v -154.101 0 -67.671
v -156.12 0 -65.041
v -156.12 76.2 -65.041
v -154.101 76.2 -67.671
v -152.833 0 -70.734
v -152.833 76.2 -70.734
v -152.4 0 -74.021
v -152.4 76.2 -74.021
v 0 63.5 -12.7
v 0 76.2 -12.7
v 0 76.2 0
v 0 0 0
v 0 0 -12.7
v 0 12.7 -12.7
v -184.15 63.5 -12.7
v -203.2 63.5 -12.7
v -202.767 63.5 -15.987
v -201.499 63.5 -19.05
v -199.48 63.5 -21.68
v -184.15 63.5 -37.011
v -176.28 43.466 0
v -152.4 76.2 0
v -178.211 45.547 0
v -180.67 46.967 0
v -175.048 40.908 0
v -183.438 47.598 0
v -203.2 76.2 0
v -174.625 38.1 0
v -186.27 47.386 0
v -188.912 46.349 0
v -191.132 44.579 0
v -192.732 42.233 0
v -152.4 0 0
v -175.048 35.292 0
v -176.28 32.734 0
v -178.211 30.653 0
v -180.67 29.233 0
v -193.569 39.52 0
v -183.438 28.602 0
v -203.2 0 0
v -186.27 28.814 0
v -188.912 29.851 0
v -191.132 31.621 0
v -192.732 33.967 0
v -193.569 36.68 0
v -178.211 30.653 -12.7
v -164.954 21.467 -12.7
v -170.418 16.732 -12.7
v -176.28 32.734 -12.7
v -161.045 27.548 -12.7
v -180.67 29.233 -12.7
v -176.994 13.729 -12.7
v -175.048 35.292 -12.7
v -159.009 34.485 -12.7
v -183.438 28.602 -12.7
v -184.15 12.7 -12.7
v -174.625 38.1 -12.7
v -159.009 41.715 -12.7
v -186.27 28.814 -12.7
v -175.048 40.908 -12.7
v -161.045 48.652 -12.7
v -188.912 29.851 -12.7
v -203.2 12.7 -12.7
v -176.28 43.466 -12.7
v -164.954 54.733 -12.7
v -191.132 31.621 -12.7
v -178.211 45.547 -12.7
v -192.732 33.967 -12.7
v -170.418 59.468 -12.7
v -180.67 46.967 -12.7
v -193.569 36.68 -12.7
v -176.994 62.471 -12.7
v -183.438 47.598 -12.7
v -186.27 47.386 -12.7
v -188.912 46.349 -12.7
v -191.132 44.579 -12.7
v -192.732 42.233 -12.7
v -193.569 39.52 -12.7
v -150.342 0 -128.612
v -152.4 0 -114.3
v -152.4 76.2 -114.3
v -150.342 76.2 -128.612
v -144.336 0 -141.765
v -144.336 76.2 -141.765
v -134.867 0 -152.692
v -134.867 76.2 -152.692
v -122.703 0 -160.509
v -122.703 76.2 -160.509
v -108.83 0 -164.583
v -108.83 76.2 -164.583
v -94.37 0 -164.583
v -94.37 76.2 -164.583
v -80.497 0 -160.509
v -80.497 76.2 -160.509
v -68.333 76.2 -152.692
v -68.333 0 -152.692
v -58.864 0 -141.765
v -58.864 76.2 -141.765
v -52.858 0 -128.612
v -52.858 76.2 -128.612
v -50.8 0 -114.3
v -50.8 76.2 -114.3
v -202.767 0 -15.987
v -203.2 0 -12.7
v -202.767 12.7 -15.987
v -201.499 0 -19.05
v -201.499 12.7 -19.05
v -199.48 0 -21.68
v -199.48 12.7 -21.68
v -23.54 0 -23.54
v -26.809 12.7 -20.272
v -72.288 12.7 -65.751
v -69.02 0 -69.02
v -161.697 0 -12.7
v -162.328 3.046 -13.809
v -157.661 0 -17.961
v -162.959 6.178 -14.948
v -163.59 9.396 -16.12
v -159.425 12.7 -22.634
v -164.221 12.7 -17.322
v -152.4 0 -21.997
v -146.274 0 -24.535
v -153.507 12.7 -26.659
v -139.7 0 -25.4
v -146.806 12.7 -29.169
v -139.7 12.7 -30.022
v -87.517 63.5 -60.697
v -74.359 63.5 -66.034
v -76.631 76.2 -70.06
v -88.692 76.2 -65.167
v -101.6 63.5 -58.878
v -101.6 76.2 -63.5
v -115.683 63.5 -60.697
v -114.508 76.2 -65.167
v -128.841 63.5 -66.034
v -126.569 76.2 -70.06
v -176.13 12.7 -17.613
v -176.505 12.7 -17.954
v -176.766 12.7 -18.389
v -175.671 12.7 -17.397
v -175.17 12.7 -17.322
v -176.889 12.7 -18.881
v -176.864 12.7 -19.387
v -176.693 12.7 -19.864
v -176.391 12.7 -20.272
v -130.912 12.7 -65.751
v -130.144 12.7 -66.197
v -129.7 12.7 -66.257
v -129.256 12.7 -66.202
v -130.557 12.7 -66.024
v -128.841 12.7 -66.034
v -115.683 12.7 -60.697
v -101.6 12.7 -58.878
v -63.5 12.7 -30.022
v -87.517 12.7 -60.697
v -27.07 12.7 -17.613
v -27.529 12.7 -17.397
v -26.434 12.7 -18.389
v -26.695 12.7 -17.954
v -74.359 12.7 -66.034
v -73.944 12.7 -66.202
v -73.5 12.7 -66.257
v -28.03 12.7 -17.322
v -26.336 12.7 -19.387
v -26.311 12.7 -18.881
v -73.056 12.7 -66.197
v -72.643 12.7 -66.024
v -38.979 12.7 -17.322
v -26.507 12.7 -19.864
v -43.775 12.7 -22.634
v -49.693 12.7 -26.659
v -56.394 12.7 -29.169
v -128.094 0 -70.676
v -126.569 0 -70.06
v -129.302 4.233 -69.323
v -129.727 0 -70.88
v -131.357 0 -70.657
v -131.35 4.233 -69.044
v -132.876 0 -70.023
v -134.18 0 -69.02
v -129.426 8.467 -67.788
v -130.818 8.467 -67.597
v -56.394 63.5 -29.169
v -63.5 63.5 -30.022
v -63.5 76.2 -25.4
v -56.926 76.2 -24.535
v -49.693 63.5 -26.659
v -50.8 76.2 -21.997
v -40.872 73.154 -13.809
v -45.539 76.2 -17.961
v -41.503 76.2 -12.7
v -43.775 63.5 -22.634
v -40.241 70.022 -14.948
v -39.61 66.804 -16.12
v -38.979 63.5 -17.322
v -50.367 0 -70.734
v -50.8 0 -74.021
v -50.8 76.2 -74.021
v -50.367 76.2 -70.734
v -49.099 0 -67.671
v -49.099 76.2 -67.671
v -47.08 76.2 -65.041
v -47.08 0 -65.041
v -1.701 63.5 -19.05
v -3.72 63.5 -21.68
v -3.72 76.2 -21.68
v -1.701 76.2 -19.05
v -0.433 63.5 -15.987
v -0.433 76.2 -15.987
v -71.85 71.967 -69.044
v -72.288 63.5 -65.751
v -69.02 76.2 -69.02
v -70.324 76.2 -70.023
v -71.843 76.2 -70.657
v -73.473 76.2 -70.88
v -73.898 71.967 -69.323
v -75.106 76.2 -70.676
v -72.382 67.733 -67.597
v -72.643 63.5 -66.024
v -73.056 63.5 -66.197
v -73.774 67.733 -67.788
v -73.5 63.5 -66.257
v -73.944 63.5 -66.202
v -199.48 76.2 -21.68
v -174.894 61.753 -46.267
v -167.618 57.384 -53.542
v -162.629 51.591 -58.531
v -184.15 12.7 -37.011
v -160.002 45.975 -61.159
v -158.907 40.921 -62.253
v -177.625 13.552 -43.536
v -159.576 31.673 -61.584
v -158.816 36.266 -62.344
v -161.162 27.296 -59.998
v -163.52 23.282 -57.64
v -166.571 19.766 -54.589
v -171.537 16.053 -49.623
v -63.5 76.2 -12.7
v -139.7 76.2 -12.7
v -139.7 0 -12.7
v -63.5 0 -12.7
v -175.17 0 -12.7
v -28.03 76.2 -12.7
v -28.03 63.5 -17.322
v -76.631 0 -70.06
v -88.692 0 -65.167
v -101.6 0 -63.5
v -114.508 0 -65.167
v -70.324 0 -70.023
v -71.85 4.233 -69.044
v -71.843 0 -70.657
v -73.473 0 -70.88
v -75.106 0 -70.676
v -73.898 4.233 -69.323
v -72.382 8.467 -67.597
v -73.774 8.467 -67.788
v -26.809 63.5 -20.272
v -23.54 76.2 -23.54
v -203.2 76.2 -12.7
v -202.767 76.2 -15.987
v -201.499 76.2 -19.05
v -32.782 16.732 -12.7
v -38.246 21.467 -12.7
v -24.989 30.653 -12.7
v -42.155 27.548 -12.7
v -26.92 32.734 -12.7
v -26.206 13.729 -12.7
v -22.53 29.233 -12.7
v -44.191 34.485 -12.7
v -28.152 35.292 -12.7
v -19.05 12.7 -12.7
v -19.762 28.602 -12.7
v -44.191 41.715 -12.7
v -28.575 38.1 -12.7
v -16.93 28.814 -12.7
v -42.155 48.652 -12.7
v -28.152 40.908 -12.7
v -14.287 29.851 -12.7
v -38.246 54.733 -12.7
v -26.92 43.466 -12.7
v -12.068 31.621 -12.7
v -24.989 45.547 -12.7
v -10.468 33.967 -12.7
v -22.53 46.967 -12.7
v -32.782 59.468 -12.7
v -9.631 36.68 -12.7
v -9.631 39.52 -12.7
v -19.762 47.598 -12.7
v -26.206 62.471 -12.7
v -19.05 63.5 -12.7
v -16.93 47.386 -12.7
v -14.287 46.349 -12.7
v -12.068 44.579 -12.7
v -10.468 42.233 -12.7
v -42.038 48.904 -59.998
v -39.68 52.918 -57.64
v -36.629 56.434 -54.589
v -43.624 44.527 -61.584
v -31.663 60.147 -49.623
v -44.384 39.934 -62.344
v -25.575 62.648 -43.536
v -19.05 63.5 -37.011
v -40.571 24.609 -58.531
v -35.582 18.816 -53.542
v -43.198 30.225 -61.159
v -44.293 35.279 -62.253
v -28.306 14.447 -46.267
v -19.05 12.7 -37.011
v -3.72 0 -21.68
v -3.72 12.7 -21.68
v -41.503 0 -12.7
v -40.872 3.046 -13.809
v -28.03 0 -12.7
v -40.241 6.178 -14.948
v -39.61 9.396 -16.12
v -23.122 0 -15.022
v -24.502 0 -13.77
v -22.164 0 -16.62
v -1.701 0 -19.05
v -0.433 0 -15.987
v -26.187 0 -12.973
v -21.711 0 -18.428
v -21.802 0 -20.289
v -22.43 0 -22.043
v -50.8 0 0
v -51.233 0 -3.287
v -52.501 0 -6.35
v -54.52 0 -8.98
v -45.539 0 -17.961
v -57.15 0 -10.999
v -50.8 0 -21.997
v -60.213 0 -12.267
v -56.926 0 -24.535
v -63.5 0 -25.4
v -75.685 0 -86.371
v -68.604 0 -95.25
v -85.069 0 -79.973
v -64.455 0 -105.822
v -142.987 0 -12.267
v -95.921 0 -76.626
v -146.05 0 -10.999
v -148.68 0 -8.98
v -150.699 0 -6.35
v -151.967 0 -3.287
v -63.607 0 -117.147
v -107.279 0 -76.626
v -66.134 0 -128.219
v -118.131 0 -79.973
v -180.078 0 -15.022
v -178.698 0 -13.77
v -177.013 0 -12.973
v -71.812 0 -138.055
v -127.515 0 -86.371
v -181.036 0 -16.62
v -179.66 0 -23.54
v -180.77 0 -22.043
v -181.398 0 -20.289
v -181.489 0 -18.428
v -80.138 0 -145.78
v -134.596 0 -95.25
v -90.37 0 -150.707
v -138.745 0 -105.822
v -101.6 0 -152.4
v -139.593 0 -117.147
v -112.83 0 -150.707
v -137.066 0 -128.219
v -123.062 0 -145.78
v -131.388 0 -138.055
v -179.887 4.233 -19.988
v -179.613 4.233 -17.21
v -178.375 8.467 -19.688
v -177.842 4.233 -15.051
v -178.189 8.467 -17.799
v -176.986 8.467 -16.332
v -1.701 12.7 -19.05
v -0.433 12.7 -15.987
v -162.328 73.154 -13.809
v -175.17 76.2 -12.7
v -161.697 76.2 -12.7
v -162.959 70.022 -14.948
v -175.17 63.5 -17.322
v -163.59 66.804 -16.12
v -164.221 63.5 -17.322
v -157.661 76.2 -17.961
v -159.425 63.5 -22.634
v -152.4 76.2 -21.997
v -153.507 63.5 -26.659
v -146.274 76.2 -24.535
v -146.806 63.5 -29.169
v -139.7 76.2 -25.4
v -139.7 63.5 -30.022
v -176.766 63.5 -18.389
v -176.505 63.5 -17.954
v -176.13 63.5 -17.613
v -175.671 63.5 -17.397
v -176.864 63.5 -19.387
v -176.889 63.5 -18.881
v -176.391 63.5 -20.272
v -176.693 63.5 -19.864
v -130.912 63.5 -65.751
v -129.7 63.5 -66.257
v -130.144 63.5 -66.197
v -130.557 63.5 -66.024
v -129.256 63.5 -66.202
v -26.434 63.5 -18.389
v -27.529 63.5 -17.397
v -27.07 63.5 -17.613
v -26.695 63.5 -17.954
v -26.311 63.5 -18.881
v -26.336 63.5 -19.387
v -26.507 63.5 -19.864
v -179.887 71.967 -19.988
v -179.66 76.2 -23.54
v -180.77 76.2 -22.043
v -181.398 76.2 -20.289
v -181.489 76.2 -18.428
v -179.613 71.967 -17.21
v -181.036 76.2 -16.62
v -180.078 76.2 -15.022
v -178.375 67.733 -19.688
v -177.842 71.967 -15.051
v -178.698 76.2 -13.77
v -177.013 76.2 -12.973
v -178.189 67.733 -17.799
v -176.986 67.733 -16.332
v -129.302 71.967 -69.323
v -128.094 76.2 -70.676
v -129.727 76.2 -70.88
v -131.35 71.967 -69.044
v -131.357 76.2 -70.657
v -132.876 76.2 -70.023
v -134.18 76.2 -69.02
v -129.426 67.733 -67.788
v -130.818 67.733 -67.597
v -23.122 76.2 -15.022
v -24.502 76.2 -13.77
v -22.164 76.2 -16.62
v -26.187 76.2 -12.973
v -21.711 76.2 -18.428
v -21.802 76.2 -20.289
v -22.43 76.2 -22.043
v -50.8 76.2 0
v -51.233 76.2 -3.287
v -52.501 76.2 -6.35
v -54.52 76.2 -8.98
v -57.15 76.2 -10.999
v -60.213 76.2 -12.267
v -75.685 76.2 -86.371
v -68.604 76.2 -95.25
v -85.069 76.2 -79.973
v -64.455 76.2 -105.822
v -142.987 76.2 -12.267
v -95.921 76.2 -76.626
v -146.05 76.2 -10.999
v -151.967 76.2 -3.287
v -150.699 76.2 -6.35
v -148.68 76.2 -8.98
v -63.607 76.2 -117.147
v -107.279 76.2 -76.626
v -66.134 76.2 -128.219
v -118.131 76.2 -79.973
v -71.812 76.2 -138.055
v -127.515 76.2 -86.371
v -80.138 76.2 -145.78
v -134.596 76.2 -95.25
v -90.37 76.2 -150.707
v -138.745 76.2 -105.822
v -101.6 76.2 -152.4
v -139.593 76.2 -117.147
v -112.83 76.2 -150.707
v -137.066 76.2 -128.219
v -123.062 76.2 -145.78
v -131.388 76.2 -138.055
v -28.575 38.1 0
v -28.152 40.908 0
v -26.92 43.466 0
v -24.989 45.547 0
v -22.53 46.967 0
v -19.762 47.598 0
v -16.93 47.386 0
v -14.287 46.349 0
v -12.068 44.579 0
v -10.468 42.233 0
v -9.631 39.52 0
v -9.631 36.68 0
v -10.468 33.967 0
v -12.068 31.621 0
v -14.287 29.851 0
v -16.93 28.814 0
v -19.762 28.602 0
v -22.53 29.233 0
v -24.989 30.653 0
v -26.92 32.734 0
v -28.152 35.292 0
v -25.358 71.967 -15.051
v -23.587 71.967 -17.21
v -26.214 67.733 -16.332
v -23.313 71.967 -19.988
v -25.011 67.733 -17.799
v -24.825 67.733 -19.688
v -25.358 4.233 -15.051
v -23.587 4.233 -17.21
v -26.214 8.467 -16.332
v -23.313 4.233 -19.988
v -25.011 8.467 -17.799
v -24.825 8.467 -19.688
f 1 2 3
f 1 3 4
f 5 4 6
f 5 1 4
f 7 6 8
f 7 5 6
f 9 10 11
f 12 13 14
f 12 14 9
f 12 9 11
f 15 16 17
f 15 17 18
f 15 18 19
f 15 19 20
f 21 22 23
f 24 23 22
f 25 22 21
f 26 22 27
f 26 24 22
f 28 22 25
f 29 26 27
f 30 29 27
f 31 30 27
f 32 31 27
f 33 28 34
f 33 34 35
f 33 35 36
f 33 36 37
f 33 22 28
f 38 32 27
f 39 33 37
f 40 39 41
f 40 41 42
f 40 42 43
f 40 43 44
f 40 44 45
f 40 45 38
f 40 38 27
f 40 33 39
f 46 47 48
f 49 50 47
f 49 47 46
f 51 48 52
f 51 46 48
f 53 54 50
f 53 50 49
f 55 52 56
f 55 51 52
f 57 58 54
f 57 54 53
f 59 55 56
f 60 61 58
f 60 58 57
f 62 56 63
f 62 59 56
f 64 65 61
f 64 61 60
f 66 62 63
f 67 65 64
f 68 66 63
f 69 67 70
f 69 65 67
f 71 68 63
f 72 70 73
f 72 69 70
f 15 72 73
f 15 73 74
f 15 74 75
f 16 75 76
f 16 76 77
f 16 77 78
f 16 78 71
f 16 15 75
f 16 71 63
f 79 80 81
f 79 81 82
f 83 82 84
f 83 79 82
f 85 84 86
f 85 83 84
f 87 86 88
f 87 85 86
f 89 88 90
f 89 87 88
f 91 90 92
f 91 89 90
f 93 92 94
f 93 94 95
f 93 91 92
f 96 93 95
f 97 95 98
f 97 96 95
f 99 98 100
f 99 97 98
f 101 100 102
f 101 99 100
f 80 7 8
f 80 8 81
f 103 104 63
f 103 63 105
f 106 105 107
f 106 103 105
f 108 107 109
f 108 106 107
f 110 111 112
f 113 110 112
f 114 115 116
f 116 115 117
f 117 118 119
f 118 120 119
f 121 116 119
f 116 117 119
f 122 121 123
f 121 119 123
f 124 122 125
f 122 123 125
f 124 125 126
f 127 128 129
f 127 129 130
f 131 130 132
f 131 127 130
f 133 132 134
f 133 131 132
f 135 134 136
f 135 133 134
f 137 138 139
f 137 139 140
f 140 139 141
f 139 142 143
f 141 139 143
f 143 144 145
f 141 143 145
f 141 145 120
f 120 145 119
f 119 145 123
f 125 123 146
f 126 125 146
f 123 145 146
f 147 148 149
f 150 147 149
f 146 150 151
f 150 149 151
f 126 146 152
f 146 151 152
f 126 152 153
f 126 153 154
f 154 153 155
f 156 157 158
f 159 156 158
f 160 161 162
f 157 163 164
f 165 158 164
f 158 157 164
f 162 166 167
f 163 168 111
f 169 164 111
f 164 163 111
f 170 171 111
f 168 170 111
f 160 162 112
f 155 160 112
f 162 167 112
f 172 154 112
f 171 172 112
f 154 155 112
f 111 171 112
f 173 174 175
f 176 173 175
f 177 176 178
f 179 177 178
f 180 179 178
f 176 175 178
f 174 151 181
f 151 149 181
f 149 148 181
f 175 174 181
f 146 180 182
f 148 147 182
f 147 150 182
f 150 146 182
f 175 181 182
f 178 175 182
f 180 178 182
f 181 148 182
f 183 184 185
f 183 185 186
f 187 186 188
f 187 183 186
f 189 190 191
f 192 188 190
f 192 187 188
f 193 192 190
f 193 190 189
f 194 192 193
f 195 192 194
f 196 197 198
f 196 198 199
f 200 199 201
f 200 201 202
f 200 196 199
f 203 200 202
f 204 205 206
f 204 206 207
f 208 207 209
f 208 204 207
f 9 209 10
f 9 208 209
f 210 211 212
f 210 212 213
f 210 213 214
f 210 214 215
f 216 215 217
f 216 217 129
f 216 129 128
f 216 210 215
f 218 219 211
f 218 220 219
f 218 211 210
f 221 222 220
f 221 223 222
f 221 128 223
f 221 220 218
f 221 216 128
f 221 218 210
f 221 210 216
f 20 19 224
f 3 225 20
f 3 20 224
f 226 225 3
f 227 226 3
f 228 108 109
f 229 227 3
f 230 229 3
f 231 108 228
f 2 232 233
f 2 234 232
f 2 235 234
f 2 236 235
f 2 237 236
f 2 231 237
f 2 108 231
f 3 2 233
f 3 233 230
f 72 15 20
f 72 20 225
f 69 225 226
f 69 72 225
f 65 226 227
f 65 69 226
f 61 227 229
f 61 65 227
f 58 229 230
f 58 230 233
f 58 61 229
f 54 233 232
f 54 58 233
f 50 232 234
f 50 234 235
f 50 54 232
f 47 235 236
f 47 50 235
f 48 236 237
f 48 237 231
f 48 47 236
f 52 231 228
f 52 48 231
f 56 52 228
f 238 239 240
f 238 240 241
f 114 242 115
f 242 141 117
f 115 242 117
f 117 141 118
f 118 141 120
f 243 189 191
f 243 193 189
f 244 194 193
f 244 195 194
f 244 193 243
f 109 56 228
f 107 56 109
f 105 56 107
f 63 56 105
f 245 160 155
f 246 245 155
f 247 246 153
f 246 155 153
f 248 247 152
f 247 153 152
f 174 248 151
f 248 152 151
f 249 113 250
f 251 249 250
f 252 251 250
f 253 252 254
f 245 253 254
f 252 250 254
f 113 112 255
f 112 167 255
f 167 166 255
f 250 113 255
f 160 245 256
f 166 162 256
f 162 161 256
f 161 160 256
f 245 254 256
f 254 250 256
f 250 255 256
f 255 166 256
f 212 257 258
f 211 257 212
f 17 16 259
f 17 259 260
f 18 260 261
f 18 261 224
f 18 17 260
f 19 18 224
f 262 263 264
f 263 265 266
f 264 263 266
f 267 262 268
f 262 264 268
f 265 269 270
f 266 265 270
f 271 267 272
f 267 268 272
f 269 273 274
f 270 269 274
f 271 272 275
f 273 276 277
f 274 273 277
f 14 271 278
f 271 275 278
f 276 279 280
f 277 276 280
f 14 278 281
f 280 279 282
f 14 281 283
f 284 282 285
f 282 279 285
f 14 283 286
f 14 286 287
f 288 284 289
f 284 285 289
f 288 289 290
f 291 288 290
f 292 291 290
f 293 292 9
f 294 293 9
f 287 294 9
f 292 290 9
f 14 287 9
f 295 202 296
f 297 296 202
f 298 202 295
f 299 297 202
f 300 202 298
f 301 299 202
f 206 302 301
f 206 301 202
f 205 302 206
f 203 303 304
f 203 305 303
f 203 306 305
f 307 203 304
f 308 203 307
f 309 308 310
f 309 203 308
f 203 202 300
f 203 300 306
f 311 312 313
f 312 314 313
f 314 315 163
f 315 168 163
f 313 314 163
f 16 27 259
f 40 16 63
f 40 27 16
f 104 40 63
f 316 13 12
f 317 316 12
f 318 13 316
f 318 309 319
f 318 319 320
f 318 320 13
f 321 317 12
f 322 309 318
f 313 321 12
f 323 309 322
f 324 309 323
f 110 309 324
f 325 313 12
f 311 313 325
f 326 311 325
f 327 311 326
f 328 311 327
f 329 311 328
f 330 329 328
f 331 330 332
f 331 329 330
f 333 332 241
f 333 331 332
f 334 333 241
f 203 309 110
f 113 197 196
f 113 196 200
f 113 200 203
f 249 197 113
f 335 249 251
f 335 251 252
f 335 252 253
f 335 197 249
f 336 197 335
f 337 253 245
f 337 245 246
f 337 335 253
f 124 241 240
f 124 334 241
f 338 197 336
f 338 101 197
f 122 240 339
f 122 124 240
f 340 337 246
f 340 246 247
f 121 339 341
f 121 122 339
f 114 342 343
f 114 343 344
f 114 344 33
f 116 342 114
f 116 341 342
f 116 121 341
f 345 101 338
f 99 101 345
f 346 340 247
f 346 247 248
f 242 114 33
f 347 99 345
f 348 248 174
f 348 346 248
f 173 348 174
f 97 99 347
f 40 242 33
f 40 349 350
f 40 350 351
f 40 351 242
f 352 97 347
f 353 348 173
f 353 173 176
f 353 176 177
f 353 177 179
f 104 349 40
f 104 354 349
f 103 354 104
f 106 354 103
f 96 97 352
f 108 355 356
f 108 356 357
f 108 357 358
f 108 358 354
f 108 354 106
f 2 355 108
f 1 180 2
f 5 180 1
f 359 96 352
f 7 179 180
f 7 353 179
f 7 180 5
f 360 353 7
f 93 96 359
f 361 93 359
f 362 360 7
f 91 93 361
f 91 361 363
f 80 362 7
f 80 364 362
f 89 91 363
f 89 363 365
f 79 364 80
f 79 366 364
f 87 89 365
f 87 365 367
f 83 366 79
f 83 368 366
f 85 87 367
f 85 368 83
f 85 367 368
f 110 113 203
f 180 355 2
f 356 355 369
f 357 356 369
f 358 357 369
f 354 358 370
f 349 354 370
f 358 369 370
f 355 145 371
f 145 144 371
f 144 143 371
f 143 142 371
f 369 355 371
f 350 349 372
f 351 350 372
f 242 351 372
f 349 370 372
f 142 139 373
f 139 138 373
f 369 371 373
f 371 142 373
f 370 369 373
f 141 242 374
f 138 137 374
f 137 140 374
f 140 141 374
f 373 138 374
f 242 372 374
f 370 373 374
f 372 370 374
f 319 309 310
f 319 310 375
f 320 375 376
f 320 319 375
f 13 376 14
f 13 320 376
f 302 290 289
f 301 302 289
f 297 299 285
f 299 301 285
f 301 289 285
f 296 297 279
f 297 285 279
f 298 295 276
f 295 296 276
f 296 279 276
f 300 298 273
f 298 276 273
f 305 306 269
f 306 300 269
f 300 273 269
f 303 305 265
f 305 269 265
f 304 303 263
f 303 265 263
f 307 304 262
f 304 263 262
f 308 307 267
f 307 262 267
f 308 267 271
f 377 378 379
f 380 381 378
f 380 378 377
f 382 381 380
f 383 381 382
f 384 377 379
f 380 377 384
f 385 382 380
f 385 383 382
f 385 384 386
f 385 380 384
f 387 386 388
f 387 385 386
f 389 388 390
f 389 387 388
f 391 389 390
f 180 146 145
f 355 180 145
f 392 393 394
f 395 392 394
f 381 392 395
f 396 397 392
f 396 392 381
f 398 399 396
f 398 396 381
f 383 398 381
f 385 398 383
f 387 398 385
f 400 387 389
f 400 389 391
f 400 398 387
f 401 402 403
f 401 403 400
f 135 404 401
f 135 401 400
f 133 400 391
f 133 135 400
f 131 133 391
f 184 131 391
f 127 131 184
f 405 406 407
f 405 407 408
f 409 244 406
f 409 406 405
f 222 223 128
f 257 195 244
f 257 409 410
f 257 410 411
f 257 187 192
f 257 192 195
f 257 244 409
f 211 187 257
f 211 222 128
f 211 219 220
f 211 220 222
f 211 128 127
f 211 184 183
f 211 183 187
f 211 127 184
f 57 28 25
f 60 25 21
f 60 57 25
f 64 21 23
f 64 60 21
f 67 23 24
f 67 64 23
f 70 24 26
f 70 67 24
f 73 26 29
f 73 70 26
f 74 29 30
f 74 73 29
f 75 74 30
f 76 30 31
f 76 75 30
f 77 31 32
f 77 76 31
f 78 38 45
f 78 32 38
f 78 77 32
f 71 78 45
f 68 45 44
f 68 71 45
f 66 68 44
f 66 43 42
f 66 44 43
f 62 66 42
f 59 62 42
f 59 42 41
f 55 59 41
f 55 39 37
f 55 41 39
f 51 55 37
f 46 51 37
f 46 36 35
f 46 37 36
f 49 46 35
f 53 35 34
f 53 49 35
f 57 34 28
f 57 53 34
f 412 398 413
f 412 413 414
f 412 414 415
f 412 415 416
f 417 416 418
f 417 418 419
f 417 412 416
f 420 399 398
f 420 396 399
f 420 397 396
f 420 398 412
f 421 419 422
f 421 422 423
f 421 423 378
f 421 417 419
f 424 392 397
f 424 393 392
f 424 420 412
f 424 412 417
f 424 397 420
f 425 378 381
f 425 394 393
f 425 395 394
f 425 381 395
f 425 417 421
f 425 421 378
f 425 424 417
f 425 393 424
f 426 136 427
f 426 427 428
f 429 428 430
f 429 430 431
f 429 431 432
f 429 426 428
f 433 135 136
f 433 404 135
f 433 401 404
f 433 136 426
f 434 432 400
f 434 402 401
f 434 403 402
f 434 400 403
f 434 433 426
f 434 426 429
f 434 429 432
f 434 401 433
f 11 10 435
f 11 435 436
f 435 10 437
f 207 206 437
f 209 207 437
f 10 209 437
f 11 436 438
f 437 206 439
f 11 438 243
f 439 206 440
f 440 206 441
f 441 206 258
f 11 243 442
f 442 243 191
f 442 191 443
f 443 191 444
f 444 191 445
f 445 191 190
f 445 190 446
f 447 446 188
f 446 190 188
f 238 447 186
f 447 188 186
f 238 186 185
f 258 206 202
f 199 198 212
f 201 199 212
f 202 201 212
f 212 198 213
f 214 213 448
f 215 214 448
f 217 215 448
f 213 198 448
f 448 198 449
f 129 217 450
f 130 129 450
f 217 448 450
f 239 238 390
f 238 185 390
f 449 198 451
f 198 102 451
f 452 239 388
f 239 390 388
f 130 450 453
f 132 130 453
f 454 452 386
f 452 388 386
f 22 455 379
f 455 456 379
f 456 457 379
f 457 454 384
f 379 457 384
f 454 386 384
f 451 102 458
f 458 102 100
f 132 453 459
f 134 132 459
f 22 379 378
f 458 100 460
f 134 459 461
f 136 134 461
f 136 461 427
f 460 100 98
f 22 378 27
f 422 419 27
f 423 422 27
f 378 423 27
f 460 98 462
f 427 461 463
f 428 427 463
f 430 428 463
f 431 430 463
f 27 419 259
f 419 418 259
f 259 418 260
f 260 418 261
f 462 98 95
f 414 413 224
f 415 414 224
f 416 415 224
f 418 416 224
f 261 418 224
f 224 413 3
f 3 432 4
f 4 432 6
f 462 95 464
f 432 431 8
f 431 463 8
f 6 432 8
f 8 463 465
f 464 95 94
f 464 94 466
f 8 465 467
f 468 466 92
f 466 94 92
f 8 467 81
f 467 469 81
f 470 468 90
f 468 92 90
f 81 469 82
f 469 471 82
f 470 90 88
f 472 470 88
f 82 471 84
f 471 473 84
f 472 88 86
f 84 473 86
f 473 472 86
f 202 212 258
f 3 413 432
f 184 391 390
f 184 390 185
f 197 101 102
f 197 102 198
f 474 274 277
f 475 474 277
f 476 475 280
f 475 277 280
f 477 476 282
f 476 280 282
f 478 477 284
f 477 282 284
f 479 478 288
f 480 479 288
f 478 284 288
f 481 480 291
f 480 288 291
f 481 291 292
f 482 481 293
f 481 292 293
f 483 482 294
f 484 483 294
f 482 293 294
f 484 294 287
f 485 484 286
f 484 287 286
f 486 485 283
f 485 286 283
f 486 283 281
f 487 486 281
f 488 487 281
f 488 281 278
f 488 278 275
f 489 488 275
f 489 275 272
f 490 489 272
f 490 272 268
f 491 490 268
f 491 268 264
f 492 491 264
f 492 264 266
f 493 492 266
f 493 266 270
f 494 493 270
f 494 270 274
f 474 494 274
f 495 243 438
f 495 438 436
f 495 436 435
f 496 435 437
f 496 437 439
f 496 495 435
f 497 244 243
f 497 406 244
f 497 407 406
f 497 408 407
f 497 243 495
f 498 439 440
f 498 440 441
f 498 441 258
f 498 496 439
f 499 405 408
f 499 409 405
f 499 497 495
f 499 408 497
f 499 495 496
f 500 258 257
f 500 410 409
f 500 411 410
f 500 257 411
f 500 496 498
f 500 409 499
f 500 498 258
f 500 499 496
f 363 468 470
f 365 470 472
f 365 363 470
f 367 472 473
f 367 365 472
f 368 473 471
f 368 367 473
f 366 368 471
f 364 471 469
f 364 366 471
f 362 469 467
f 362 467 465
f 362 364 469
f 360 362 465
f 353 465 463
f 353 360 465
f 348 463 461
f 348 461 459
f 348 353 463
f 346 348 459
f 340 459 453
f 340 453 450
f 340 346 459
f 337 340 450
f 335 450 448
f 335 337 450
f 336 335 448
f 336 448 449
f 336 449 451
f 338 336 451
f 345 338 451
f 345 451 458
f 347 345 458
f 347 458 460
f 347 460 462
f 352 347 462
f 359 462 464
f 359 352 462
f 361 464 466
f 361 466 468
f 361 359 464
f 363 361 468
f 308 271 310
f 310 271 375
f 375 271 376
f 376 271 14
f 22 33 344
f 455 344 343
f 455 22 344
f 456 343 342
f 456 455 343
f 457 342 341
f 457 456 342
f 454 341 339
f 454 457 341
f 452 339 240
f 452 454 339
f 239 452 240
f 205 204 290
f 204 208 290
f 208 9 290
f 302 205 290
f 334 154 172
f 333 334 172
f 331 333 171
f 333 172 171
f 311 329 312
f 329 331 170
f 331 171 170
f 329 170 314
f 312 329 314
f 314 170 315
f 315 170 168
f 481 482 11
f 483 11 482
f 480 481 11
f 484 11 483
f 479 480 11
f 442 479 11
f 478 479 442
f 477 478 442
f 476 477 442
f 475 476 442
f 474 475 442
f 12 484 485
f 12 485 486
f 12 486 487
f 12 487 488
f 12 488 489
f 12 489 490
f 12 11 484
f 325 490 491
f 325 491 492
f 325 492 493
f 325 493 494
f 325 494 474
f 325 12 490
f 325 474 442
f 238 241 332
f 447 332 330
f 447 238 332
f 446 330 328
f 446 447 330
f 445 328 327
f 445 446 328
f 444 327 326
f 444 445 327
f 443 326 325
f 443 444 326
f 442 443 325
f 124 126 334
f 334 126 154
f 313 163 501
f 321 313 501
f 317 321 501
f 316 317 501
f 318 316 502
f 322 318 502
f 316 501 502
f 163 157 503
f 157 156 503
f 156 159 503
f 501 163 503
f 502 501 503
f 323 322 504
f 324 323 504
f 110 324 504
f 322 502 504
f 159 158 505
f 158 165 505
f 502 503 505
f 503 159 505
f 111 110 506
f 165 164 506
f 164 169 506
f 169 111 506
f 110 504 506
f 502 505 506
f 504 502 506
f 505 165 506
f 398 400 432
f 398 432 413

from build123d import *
from OCP.BRepFilletAPI import BRepFilletAPI_MakeChamfer

# Parameters (mm, degrees)
SKETCH1_R                  = 38.1
BOSS_EXTRUDE1_DEPTH        = 76.2
CUT_EXTRUDE1_DEPTH         = 273.680564031
CUT_EXTRUDE2_START         = -12.7
CUT_EXTRUDE2_DEPTH         = 260.980564031
SKETCH5_R                  = 9.525
CUT_EXTRUDE3_DEPTH         = 266.183785326
CUT_EXTRUDE4_START         = -12.7
CUT_EXTRUDE4_DEPTH         = 12.7
CHAMFER1_SIZE              = 12.7
CHAMFER1_SIZE_2            = 4.622421975
CHAMFER1_OF_MIRROR2_SIZE   = 12.7
CHAMFER1_OF_MIRROR2_SIZE_2 = 4.622421975


with BuildPart() as part:
    # Sketch1 → Boss-Extrude1 (new body)
    with BuildSketch(Plane(origin=(0, 0, 0), x_dir=(1, 0, 0), z_dir=(0, 1, 0))):
        with BuildLine():
            Line((0, 0), (-203.2, 0))
            Line((-203.2, 0), (-203.2, 12.7))
            ThreePointArc((-203.2, 12.7), (-202.233270063, 17.560079591), (-199.480256121, 21.680256121))
            Line((-199.480256121, 21.680256121), (-156.119743879, 65.040768363))
            ThreePointArc((-156.119743879, 65.040768363), (-153.366729937, 69.160944893), (-152.4, 74.021024484))
            Line((-152.4, 74.021024484), (-152.4, 114.3))
            ThreePointArc((-152.4, 114.3), (-101.6, 165.1), (-50.8, 114.3))
            Line((-50.8, 114.3), (-50.8, 74.021024484))
            ThreePointArc((-50.8, 74.021024484), (-49.833270063, 69.160944893), (-47.080256121, 65.040768363))
            Line((-47.080256121, 65.040768363), (-3.719743879, 21.680256121))
            ThreePointArc((-3.719743879, 21.680256121), (-0.966729937, 17.560079591), (0, 12.7))
            Line((0, 12.7), (0, 0))
        make_face()
        with Locations(Location((-101.6, 114.3, 0), (0, 0, 90))):
            Circle(SKETCH1_R, mode=Mode.SUBTRACT)
    extrude(amount=BOSS_EXTRUDE1_DEPTH)

    # Sketch2 → Cut-Extrude1 (cut, through all)
    with BuildSketch(Plane(origin=(0, 76.2, 0), x_dir=(1, 0, 0), z_dir=(0, 1, 0))):
        with BuildLine():
            Line((-139.7, 12.7), (-63.5, 12.7))
            ThreePointArc((-63.5, 12.7), (-50.8, 0), (-63.5, -12.7))
            Line((-63.5, -12.7), (-139.7, -12.7))
            ThreePointArc((-139.7, -12.7), (-152.4, 0), (-139.7, 12.7))
        make_face()
    extrude(amount=-CUT_EXTRUDE1_DEPTH, mode=Mode.SUBTRACT)

    # Sketch4 → Cut-Extrude2 (cut, through all)
    with BuildSketch(Plane.XY.offset(CUT_EXTRUDE2_START)):
        with BuildLine():
            Line((0, 63.5), (-19.05, 63.5))
            ThreePointArc((-19.05, 63.5), (-44.45, 38.1), (-19.05, 12.7))
            Line((-19.05, 12.7), (0, 12.7))
            Line((0, 12.7), (0, 63.5))
        make_face()
    cut_extrude2 = extrude(amount=-CUT_EXTRUDE2_DEPTH, mode=Mode.SUBTRACT)

    # Sketch5 → Cut-Extrude3 (cut, through all)
    with BuildSketch(Plane(origin=(0, 0, -12.7), x_dir=(-1, 0, 0), z_dir=(0, 0, -1))):
        with Locations((19.05, 38.1)):
            Circle(SKETCH5_R)
    cut_extrude3 = extrude(amount=-CUT_EXTRUDE3_DEPTH, mode=Mode.SUBTRACT)

    # Mirror1: Cut-Extrude2, Cut-Extrude3 across plane
    add(cut_extrude2.mirror(Plane(origin=(-101.6, 0, 0), x_dir=(0, 0, 1), z_dir=(1, 0, 0))), mode=Mode.SUBTRACT)
    add(cut_extrude3.mirror(Plane(origin=(-101.6, 0, 0), x_dir=(0, 0, 1), z_dir=(1, 0, 0))), mode=Mode.SUBTRACT)

    # Sketch6 → Cut-Extrude4 (cut)
    with BuildSketch(Plane(origin=(0, 76.2, 0), x_dir=(1, 0, 0), z_dir=(0, 1, 0)).offset(CUT_EXTRUDE4_START)):
        with BuildLine():
            Line((-23.540128061, 23.540128061), (-69.01989759, 69.01989759))
            ThreePointArc((-69.01989759, 69.01989759), (-72.650432416, 70.821319376), (-76.631133912, 70.059795138))
            ThreePointArc((-76.631133912, 70.059795138), (-101.6, 63.5), (-126.568866088, 70.059795138))
            ThreePointArc((-126.568866088, 70.059795138), (-130.549567584, 70.821319376), (-134.18010241, 69.01989759))
            Line((-134.18010241, 69.01989759), (-179.659871939, 23.540128061))
            ThreePointArc((-179.659871939, 23.540128061), (-181.03637891, 16.619960204), (-175.169743879, 12.7))
            Line((-175.169743879, 12.7), (-161.697045256, 12.7))
            ThreePointArc((-161.697045256, 12.7), (-152.4, 21.997045256), (-139.7, 25.4))
            Line((-139.7, 25.4), (-63.5, 25.4))
            ThreePointArc((-63.5, 25.4), (-50.8, 21.997045256), (-41.502954744, 12.7))
            Line((-41.502954744, 12.7), (-28.030256121, 12.7))
            ThreePointArc((-28.030256121, 12.7), (-22.16362109, 16.619960204), (-23.540128061, 23.540128061))
        make_face()
    cut_extrude4 = extrude(amount=CUT_EXTRUDE4_DEPTH, mode=Mode.SUBTRACT)

    # Chamfer1
    chamfer1_edges_1 = [part.edges().sort_by_distance(p)[0] for p in [
        (-46.280012825, 63.5, -46.280012825),
    ]]
    chamfer1_side_1 = [part.faces().sort_by_distance(p)[0] for p in [
        (-46.280012825, 63.59244844, -46.280012825),
    ]]
    chamfer1_edges_2 = [part.edges().sort_by_distance(p)[0] for p in [
        (-22.16362109, 63.5, -16.619960204),
    ]]
    chamfer1_side_2 = [part.faces().sort_by_distance(p)[0] for p in [
        (-22.16362109, 63.59244844, -16.619960204),
    ]]
    chamfer1_edges_3 = [part.edges().sort_by_distance(p)[0] for p in [
        (-34.766605432, 63.5, -12.7),
    ]]
    chamfer1_side_3 = [part.faces().sort_by_distance(p)[0] for p in [
        (-34.766605432, 63.59244844, -12.7),
    ]]
    chamfer1_edges_4 = [part.edges().sort_by_distance(p)[0] for p in [
        (-50.8, 63.5, -21.997045256),
    ]]
    chamfer1_side_4 = [part.faces().sort_by_distance(p)[0] for p in [
        (-50.8, 63.59244844, -21.997045256),
    ]]
    chamfer1_edges_5 = [part.edges().sort_by_distance(p)[0] for p in [
        (-101.6, 63.5, -25.4),
    ]]
    chamfer1_side_5 = [part.faces().sort_by_distance(p)[0] for p in [
        (-101.6, 63.59244844, -25.4),
    ]]
    chamfer1_edges_6 = [part.edges().sort_by_distance(p)[0] for p in [
        (-152.4, 63.5, -21.997045256),
    ]]
    chamfer1_side_6 = [part.faces().sort_by_distance(p)[0] for p in [
        (-152.4, 63.59244844, -21.997045256),
    ]]
    chamfer1_edges_7 = [part.edges().sort_by_distance(p)[0] for p in [
        (-168.433394568, 63.5, -12.7),
    ]]
    chamfer1_side_7 = [part.faces().sort_by_distance(p)[0] for p in [
        (-168.433394568, 63.59244844, -12.7),
    ]]
    chamfer1_edges_8 = [part.edges().sort_by_distance(p)[0] for p in [
        (-181.03637891, 63.5, -16.619960204),
    ]]
    chamfer1_side_8 = [part.faces().sort_by_distance(p)[0] for p in [
        (-181.03637891, 63.59244844, -16.619960204),
    ]]
    chamfer1_edges_9 = [part.edges().sort_by_distance(p)[0] for p in [
        (-156.919987175, 63.5, -46.280012825),
    ]]
    chamfer1_side_9 = [part.faces().sort_by_distance(p)[0] for p in [
        (-156.919987175, 63.59244844, -46.280012825),
    ]]
    chamfer1_edges_10 = [part.edges().sort_by_distance(p)[0] for p in [
        (-130.549567584, 63.5, -70.821319376),
    ]]
    chamfer1_side_10 = [part.faces().sort_by_distance(p)[0] for p in [
        (-130.549567584, 63.59244844, -70.821319376),
    ]]
    chamfer1_edges_11 = [part.edges().sort_by_distance(p)[0] for p in [
        (-101.6, 63.5, -63.5),
    ]]
    chamfer1_side_11 = [part.faces().sort_by_distance(p)[0] for p in [
        (-101.6, 63.59244844, -63.5),
    ]]
    chamfer1_edges_12 = [part.edges().sort_by_distance(p)[0] for p in [
        (-72.650432416, 63.5, -70.821319376),
    ]]
    chamfer1_side_12 = [part.faces().sort_by_distance(p)[0] for p in [
        (-72.650432416, 63.59244844, -70.821319376),
    ]]
    chamfer1 = BRepFilletAPI_MakeChamfer(part.part.solid().wrapped)
    for e in chamfer1_edges_1:
        chamfer1.Add(CHAMFER1_SIZE - 0.0001, CHAMFER1_SIZE_2 - 0.0001, e.wrapped, chamfer1_side_1[0].wrapped)
    for e in chamfer1_edges_2:
        chamfer1.Add(CHAMFER1_SIZE - 0.0001, CHAMFER1_SIZE_2 - 0.0001, e.wrapped, chamfer1_side_2[0].wrapped)
    for e in chamfer1_edges_3:
        chamfer1.Add(CHAMFER1_SIZE - 0.0001, CHAMFER1_SIZE_2 - 0.0001, e.wrapped, chamfer1_side_3[0].wrapped)
    for e in chamfer1_edges_4:
        chamfer1.Add(CHAMFER1_SIZE - 0.0001, CHAMFER1_SIZE_2 - 0.0001, e.wrapped, chamfer1_side_4[0].wrapped)
    for e in chamfer1_edges_5:
        chamfer1.Add(CHAMFER1_SIZE - 0.0001, CHAMFER1_SIZE_2 - 0.0001, e.wrapped, chamfer1_side_5[0].wrapped)
    for e in chamfer1_edges_6:
        chamfer1.Add(CHAMFER1_SIZE - 0.0001, CHAMFER1_SIZE_2 - 0.0001, e.wrapped, chamfer1_side_6[0].wrapped)
    for e in chamfer1_edges_7:
        chamfer1.Add(CHAMFER1_SIZE - 0.0001, CHAMFER1_SIZE_2 - 0.0001, e.wrapped, chamfer1_side_7[0].wrapped)
    for e in chamfer1_edges_8:
        chamfer1.Add(CHAMFER1_SIZE - 0.0001, CHAMFER1_SIZE_2 - 0.0001, e.wrapped, chamfer1_side_8[0].wrapped)
    for e in chamfer1_edges_9:
        chamfer1.Add(CHAMFER1_SIZE - 0.0001, CHAMFER1_SIZE_2 - 0.0001, e.wrapped, chamfer1_side_9[0].wrapped)
    for e in chamfer1_edges_10:
        chamfer1.Add(CHAMFER1_SIZE - 0.0001, CHAMFER1_SIZE_2 - 0.0001, e.wrapped, chamfer1_side_10[0].wrapped)
    for e in chamfer1_edges_11:
        chamfer1.Add(CHAMFER1_SIZE - 0.0001, CHAMFER1_SIZE_2 - 0.0001, e.wrapped, chamfer1_side_11[0].wrapped)
    for e in chamfer1_edges_12:
        chamfer1.Add(CHAMFER1_SIZE - 0.0001, CHAMFER1_SIZE_2 - 0.0001, e.wrapped, chamfer1_side_12[0].wrapped)
    add(Compound.cast(chamfer1.Shape()), mode=Mode.REPLACE)  # a hair under: the kernel refuses the full size

    # Mirror2: Cut-Extrude4 across plane
    add(cut_extrude4.mirror(Plane.ZX.offset(38.1)), mode=Mode.SUBTRACT)

    # Chamfer1 of Mirror2
    chamfer1_of_mirror2_edges_1 = [part.edges().sort_by_distance(p)[0] for p in [
        (-46.280012825, 12.7, -46.280012825),
    ]]
    chamfer1_of_mirror2_side_1 = [part.faces().sort_by_distance(p)[0] for p in [
        (-46.280012825, 12.60755156, -46.280012825),
    ]]
    chamfer1_of_mirror2_edges_2 = [part.edges().sort_by_distance(p)[0] for p in [
        (-22.16362109, 12.7, -16.619960204),
    ]]
    chamfer1_of_mirror2_side_2 = [part.faces().sort_by_distance(p)[0] for p in [
        (-22.16362109, 12.60755156, -16.619960204),
    ]]
    chamfer1_of_mirror2_edges_3 = [part.edges().sort_by_distance(p)[0] for p in [
        (-34.766605432, 12.7, -12.7),
    ]]
    chamfer1_of_mirror2_side_3 = [part.faces().sort_by_distance(p)[0] for p in [
        (-34.766605432, 12.60755156, -12.7),
    ]]
    chamfer1_of_mirror2_edges_4 = [part.edges().sort_by_distance(p)[0] for p in [
        (-50.8, 12.7, -21.997045256),
    ]]
    chamfer1_of_mirror2_side_4 = [part.faces().sort_by_distance(p)[0] for p in [
        (-50.8, 12.60755156, -21.997045256),
    ]]
    chamfer1_of_mirror2_edges_5 = [part.edges().sort_by_distance(p)[0] for p in [
        (-101.6, 12.7, -25.4),
    ]]
    chamfer1_of_mirror2_side_5 = [part.faces().sort_by_distance(p)[0] for p in [
        (-101.6, 12.60755156, -25.4),
    ]]
    chamfer1_of_mirror2_edges_6 = [part.edges().sort_by_distance(p)[0] for p in [
        (-152.4, 12.7, -21.997045256),
    ]]
    chamfer1_of_mirror2_side_6 = [part.faces().sort_by_distance(p)[0] for p in [
        (-152.4, 12.60755156, -21.997045256),
    ]]
    chamfer1_of_mirror2_edges_7 = [part.edges().sort_by_distance(p)[0] for p in [
        (-168.433394568, 12.7, -12.7),
    ]]
    chamfer1_of_mirror2_side_7 = [part.faces().sort_by_distance(p)[0] for p in [
        (-168.433394568, 12.60755156, -12.7),
    ]]
    chamfer1_of_mirror2_edges_8 = [part.edges().sort_by_distance(p)[0] for p in [
        (-181.03637891, 12.7, -16.619960204),
    ]]
    chamfer1_of_mirror2_side_8 = [part.faces().sort_by_distance(p)[0] for p in [
        (-181.03637891, 12.60755156, -16.619960204),
    ]]
    chamfer1_of_mirror2_edges_9 = [part.edges().sort_by_distance(p)[0] for p in [
        (-156.919987175, 12.7, -46.280012825),
    ]]
    chamfer1_of_mirror2_side_9 = [part.faces().sort_by_distance(p)[0] for p in [
        (-156.919987175, 12.60755156, -46.280012825),
    ]]
    chamfer1_of_mirror2_edges_10 = [part.edges().sort_by_distance(p)[0] for p in [
        (-130.549567584, 12.7, -70.821319376),
    ]]
    chamfer1_of_mirror2_side_10 = [part.faces().sort_by_distance(p)[0] for p in [
        (-130.549567584, 12.60755156, -70.821319376),
    ]]
    chamfer1_of_mirror2_edges_11 = [part.edges().sort_by_distance(p)[0] for p in [
        (-101.6, 12.7, -63.5),
    ]]
    chamfer1_of_mirror2_side_11 = [part.faces().sort_by_distance(p)[0] for p in [
        (-101.6, 12.60755156, -63.5),
    ]]
    chamfer1_of_mirror2_edges_12 = [part.edges().sort_by_distance(p)[0] for p in [
        (-72.650432416, 12.7, -70.821319376),
    ]]
    chamfer1_of_mirror2_side_12 = [part.faces().sort_by_distance(p)[0] for p in [
        (-72.650432416, 12.60755156, -70.821319376),
    ]]
    chamfer1_of_mirror2 = BRepFilletAPI_MakeChamfer(part.part.solid().wrapped)
    for e in chamfer1_of_mirror2_edges_1:
        chamfer1_of_mirror2.Add(CHAMFER1_OF_MIRROR2_SIZE - 0.0001, CHAMFER1_OF_MIRROR2_SIZE_2 - 0.0001, e.wrapped, chamfer1_of_mirror2_side_1[0].wrapped)
    for e in chamfer1_of_mirror2_edges_2:
        chamfer1_of_mirror2.Add(CHAMFER1_OF_MIRROR2_SIZE - 0.0001, CHAMFER1_OF_MIRROR2_SIZE_2 - 0.0001, e.wrapped, chamfer1_of_mirror2_side_2[0].wrapped)
    for e in chamfer1_of_mirror2_edges_3:
        chamfer1_of_mirror2.Add(CHAMFER1_OF_MIRROR2_SIZE - 0.0001, CHAMFER1_OF_MIRROR2_SIZE_2 - 0.0001, e.wrapped, chamfer1_of_mirror2_side_3[0].wrapped)
    for e in chamfer1_of_mirror2_edges_4:
        chamfer1_of_mirror2.Add(CHAMFER1_OF_MIRROR2_SIZE - 0.0001, CHAMFER1_OF_MIRROR2_SIZE_2 - 0.0001, e.wrapped, chamfer1_of_mirror2_side_4[0].wrapped)
    for e in chamfer1_of_mirror2_edges_5:
        chamfer1_of_mirror2.Add(CHAMFER1_OF_MIRROR2_SIZE - 0.0001, CHAMFER1_OF_MIRROR2_SIZE_2 - 0.0001, e.wrapped, chamfer1_of_mirror2_side_5[0].wrapped)
    for e in chamfer1_of_mirror2_edges_6:
        chamfer1_of_mirror2.Add(CHAMFER1_OF_MIRROR2_SIZE - 0.0001, CHAMFER1_OF_MIRROR2_SIZE_2 - 0.0001, e.wrapped, chamfer1_of_mirror2_side_6[0].wrapped)
    for e in chamfer1_of_mirror2_edges_7:
        chamfer1_of_mirror2.Add(CHAMFER1_OF_MIRROR2_SIZE - 0.0001, CHAMFER1_OF_MIRROR2_SIZE_2 - 0.0001, e.wrapped, chamfer1_of_mirror2_side_7[0].wrapped)
    for e in chamfer1_of_mirror2_edges_8:
        chamfer1_of_mirror2.Add(CHAMFER1_OF_MIRROR2_SIZE - 0.0001, CHAMFER1_OF_MIRROR2_SIZE_2 - 0.0001, e.wrapped, chamfer1_of_mirror2_side_8[0].wrapped)
    for e in chamfer1_of_mirror2_edges_9:
        chamfer1_of_mirror2.Add(CHAMFER1_OF_MIRROR2_SIZE - 0.0001, CHAMFER1_OF_MIRROR2_SIZE_2 - 0.0001, e.wrapped, chamfer1_of_mirror2_side_9[0].wrapped)
    for e in chamfer1_of_mirror2_edges_10:
        chamfer1_of_mirror2.Add(CHAMFER1_OF_MIRROR2_SIZE - 0.0001, CHAMFER1_OF_MIRROR2_SIZE_2 - 0.0001, e.wrapped, chamfer1_of_mirror2_side_10[0].wrapped)
    for e in chamfer1_of_mirror2_edges_11:
        chamfer1_of_mirror2.Add(CHAMFER1_OF_MIRROR2_SIZE - 0.0001, CHAMFER1_OF_MIRROR2_SIZE_2 - 0.0001, e.wrapped, chamfer1_of_mirror2_side_11[0].wrapped)
    for e in chamfer1_of_mirror2_edges_12:
        chamfer1_of_mirror2.Add(CHAMFER1_OF_MIRROR2_SIZE - 0.0001, CHAMFER1_OF_MIRROR2_SIZE_2 - 0.0001, e.wrapped, chamfer1_of_mirror2_side_12[0].wrapped)
    add(Compound.cast(chamfer1_of_mirror2.Shape()), mode=Mode.REPLACE)  # a hair under: the kernel refuses the full size


solid = part.part
